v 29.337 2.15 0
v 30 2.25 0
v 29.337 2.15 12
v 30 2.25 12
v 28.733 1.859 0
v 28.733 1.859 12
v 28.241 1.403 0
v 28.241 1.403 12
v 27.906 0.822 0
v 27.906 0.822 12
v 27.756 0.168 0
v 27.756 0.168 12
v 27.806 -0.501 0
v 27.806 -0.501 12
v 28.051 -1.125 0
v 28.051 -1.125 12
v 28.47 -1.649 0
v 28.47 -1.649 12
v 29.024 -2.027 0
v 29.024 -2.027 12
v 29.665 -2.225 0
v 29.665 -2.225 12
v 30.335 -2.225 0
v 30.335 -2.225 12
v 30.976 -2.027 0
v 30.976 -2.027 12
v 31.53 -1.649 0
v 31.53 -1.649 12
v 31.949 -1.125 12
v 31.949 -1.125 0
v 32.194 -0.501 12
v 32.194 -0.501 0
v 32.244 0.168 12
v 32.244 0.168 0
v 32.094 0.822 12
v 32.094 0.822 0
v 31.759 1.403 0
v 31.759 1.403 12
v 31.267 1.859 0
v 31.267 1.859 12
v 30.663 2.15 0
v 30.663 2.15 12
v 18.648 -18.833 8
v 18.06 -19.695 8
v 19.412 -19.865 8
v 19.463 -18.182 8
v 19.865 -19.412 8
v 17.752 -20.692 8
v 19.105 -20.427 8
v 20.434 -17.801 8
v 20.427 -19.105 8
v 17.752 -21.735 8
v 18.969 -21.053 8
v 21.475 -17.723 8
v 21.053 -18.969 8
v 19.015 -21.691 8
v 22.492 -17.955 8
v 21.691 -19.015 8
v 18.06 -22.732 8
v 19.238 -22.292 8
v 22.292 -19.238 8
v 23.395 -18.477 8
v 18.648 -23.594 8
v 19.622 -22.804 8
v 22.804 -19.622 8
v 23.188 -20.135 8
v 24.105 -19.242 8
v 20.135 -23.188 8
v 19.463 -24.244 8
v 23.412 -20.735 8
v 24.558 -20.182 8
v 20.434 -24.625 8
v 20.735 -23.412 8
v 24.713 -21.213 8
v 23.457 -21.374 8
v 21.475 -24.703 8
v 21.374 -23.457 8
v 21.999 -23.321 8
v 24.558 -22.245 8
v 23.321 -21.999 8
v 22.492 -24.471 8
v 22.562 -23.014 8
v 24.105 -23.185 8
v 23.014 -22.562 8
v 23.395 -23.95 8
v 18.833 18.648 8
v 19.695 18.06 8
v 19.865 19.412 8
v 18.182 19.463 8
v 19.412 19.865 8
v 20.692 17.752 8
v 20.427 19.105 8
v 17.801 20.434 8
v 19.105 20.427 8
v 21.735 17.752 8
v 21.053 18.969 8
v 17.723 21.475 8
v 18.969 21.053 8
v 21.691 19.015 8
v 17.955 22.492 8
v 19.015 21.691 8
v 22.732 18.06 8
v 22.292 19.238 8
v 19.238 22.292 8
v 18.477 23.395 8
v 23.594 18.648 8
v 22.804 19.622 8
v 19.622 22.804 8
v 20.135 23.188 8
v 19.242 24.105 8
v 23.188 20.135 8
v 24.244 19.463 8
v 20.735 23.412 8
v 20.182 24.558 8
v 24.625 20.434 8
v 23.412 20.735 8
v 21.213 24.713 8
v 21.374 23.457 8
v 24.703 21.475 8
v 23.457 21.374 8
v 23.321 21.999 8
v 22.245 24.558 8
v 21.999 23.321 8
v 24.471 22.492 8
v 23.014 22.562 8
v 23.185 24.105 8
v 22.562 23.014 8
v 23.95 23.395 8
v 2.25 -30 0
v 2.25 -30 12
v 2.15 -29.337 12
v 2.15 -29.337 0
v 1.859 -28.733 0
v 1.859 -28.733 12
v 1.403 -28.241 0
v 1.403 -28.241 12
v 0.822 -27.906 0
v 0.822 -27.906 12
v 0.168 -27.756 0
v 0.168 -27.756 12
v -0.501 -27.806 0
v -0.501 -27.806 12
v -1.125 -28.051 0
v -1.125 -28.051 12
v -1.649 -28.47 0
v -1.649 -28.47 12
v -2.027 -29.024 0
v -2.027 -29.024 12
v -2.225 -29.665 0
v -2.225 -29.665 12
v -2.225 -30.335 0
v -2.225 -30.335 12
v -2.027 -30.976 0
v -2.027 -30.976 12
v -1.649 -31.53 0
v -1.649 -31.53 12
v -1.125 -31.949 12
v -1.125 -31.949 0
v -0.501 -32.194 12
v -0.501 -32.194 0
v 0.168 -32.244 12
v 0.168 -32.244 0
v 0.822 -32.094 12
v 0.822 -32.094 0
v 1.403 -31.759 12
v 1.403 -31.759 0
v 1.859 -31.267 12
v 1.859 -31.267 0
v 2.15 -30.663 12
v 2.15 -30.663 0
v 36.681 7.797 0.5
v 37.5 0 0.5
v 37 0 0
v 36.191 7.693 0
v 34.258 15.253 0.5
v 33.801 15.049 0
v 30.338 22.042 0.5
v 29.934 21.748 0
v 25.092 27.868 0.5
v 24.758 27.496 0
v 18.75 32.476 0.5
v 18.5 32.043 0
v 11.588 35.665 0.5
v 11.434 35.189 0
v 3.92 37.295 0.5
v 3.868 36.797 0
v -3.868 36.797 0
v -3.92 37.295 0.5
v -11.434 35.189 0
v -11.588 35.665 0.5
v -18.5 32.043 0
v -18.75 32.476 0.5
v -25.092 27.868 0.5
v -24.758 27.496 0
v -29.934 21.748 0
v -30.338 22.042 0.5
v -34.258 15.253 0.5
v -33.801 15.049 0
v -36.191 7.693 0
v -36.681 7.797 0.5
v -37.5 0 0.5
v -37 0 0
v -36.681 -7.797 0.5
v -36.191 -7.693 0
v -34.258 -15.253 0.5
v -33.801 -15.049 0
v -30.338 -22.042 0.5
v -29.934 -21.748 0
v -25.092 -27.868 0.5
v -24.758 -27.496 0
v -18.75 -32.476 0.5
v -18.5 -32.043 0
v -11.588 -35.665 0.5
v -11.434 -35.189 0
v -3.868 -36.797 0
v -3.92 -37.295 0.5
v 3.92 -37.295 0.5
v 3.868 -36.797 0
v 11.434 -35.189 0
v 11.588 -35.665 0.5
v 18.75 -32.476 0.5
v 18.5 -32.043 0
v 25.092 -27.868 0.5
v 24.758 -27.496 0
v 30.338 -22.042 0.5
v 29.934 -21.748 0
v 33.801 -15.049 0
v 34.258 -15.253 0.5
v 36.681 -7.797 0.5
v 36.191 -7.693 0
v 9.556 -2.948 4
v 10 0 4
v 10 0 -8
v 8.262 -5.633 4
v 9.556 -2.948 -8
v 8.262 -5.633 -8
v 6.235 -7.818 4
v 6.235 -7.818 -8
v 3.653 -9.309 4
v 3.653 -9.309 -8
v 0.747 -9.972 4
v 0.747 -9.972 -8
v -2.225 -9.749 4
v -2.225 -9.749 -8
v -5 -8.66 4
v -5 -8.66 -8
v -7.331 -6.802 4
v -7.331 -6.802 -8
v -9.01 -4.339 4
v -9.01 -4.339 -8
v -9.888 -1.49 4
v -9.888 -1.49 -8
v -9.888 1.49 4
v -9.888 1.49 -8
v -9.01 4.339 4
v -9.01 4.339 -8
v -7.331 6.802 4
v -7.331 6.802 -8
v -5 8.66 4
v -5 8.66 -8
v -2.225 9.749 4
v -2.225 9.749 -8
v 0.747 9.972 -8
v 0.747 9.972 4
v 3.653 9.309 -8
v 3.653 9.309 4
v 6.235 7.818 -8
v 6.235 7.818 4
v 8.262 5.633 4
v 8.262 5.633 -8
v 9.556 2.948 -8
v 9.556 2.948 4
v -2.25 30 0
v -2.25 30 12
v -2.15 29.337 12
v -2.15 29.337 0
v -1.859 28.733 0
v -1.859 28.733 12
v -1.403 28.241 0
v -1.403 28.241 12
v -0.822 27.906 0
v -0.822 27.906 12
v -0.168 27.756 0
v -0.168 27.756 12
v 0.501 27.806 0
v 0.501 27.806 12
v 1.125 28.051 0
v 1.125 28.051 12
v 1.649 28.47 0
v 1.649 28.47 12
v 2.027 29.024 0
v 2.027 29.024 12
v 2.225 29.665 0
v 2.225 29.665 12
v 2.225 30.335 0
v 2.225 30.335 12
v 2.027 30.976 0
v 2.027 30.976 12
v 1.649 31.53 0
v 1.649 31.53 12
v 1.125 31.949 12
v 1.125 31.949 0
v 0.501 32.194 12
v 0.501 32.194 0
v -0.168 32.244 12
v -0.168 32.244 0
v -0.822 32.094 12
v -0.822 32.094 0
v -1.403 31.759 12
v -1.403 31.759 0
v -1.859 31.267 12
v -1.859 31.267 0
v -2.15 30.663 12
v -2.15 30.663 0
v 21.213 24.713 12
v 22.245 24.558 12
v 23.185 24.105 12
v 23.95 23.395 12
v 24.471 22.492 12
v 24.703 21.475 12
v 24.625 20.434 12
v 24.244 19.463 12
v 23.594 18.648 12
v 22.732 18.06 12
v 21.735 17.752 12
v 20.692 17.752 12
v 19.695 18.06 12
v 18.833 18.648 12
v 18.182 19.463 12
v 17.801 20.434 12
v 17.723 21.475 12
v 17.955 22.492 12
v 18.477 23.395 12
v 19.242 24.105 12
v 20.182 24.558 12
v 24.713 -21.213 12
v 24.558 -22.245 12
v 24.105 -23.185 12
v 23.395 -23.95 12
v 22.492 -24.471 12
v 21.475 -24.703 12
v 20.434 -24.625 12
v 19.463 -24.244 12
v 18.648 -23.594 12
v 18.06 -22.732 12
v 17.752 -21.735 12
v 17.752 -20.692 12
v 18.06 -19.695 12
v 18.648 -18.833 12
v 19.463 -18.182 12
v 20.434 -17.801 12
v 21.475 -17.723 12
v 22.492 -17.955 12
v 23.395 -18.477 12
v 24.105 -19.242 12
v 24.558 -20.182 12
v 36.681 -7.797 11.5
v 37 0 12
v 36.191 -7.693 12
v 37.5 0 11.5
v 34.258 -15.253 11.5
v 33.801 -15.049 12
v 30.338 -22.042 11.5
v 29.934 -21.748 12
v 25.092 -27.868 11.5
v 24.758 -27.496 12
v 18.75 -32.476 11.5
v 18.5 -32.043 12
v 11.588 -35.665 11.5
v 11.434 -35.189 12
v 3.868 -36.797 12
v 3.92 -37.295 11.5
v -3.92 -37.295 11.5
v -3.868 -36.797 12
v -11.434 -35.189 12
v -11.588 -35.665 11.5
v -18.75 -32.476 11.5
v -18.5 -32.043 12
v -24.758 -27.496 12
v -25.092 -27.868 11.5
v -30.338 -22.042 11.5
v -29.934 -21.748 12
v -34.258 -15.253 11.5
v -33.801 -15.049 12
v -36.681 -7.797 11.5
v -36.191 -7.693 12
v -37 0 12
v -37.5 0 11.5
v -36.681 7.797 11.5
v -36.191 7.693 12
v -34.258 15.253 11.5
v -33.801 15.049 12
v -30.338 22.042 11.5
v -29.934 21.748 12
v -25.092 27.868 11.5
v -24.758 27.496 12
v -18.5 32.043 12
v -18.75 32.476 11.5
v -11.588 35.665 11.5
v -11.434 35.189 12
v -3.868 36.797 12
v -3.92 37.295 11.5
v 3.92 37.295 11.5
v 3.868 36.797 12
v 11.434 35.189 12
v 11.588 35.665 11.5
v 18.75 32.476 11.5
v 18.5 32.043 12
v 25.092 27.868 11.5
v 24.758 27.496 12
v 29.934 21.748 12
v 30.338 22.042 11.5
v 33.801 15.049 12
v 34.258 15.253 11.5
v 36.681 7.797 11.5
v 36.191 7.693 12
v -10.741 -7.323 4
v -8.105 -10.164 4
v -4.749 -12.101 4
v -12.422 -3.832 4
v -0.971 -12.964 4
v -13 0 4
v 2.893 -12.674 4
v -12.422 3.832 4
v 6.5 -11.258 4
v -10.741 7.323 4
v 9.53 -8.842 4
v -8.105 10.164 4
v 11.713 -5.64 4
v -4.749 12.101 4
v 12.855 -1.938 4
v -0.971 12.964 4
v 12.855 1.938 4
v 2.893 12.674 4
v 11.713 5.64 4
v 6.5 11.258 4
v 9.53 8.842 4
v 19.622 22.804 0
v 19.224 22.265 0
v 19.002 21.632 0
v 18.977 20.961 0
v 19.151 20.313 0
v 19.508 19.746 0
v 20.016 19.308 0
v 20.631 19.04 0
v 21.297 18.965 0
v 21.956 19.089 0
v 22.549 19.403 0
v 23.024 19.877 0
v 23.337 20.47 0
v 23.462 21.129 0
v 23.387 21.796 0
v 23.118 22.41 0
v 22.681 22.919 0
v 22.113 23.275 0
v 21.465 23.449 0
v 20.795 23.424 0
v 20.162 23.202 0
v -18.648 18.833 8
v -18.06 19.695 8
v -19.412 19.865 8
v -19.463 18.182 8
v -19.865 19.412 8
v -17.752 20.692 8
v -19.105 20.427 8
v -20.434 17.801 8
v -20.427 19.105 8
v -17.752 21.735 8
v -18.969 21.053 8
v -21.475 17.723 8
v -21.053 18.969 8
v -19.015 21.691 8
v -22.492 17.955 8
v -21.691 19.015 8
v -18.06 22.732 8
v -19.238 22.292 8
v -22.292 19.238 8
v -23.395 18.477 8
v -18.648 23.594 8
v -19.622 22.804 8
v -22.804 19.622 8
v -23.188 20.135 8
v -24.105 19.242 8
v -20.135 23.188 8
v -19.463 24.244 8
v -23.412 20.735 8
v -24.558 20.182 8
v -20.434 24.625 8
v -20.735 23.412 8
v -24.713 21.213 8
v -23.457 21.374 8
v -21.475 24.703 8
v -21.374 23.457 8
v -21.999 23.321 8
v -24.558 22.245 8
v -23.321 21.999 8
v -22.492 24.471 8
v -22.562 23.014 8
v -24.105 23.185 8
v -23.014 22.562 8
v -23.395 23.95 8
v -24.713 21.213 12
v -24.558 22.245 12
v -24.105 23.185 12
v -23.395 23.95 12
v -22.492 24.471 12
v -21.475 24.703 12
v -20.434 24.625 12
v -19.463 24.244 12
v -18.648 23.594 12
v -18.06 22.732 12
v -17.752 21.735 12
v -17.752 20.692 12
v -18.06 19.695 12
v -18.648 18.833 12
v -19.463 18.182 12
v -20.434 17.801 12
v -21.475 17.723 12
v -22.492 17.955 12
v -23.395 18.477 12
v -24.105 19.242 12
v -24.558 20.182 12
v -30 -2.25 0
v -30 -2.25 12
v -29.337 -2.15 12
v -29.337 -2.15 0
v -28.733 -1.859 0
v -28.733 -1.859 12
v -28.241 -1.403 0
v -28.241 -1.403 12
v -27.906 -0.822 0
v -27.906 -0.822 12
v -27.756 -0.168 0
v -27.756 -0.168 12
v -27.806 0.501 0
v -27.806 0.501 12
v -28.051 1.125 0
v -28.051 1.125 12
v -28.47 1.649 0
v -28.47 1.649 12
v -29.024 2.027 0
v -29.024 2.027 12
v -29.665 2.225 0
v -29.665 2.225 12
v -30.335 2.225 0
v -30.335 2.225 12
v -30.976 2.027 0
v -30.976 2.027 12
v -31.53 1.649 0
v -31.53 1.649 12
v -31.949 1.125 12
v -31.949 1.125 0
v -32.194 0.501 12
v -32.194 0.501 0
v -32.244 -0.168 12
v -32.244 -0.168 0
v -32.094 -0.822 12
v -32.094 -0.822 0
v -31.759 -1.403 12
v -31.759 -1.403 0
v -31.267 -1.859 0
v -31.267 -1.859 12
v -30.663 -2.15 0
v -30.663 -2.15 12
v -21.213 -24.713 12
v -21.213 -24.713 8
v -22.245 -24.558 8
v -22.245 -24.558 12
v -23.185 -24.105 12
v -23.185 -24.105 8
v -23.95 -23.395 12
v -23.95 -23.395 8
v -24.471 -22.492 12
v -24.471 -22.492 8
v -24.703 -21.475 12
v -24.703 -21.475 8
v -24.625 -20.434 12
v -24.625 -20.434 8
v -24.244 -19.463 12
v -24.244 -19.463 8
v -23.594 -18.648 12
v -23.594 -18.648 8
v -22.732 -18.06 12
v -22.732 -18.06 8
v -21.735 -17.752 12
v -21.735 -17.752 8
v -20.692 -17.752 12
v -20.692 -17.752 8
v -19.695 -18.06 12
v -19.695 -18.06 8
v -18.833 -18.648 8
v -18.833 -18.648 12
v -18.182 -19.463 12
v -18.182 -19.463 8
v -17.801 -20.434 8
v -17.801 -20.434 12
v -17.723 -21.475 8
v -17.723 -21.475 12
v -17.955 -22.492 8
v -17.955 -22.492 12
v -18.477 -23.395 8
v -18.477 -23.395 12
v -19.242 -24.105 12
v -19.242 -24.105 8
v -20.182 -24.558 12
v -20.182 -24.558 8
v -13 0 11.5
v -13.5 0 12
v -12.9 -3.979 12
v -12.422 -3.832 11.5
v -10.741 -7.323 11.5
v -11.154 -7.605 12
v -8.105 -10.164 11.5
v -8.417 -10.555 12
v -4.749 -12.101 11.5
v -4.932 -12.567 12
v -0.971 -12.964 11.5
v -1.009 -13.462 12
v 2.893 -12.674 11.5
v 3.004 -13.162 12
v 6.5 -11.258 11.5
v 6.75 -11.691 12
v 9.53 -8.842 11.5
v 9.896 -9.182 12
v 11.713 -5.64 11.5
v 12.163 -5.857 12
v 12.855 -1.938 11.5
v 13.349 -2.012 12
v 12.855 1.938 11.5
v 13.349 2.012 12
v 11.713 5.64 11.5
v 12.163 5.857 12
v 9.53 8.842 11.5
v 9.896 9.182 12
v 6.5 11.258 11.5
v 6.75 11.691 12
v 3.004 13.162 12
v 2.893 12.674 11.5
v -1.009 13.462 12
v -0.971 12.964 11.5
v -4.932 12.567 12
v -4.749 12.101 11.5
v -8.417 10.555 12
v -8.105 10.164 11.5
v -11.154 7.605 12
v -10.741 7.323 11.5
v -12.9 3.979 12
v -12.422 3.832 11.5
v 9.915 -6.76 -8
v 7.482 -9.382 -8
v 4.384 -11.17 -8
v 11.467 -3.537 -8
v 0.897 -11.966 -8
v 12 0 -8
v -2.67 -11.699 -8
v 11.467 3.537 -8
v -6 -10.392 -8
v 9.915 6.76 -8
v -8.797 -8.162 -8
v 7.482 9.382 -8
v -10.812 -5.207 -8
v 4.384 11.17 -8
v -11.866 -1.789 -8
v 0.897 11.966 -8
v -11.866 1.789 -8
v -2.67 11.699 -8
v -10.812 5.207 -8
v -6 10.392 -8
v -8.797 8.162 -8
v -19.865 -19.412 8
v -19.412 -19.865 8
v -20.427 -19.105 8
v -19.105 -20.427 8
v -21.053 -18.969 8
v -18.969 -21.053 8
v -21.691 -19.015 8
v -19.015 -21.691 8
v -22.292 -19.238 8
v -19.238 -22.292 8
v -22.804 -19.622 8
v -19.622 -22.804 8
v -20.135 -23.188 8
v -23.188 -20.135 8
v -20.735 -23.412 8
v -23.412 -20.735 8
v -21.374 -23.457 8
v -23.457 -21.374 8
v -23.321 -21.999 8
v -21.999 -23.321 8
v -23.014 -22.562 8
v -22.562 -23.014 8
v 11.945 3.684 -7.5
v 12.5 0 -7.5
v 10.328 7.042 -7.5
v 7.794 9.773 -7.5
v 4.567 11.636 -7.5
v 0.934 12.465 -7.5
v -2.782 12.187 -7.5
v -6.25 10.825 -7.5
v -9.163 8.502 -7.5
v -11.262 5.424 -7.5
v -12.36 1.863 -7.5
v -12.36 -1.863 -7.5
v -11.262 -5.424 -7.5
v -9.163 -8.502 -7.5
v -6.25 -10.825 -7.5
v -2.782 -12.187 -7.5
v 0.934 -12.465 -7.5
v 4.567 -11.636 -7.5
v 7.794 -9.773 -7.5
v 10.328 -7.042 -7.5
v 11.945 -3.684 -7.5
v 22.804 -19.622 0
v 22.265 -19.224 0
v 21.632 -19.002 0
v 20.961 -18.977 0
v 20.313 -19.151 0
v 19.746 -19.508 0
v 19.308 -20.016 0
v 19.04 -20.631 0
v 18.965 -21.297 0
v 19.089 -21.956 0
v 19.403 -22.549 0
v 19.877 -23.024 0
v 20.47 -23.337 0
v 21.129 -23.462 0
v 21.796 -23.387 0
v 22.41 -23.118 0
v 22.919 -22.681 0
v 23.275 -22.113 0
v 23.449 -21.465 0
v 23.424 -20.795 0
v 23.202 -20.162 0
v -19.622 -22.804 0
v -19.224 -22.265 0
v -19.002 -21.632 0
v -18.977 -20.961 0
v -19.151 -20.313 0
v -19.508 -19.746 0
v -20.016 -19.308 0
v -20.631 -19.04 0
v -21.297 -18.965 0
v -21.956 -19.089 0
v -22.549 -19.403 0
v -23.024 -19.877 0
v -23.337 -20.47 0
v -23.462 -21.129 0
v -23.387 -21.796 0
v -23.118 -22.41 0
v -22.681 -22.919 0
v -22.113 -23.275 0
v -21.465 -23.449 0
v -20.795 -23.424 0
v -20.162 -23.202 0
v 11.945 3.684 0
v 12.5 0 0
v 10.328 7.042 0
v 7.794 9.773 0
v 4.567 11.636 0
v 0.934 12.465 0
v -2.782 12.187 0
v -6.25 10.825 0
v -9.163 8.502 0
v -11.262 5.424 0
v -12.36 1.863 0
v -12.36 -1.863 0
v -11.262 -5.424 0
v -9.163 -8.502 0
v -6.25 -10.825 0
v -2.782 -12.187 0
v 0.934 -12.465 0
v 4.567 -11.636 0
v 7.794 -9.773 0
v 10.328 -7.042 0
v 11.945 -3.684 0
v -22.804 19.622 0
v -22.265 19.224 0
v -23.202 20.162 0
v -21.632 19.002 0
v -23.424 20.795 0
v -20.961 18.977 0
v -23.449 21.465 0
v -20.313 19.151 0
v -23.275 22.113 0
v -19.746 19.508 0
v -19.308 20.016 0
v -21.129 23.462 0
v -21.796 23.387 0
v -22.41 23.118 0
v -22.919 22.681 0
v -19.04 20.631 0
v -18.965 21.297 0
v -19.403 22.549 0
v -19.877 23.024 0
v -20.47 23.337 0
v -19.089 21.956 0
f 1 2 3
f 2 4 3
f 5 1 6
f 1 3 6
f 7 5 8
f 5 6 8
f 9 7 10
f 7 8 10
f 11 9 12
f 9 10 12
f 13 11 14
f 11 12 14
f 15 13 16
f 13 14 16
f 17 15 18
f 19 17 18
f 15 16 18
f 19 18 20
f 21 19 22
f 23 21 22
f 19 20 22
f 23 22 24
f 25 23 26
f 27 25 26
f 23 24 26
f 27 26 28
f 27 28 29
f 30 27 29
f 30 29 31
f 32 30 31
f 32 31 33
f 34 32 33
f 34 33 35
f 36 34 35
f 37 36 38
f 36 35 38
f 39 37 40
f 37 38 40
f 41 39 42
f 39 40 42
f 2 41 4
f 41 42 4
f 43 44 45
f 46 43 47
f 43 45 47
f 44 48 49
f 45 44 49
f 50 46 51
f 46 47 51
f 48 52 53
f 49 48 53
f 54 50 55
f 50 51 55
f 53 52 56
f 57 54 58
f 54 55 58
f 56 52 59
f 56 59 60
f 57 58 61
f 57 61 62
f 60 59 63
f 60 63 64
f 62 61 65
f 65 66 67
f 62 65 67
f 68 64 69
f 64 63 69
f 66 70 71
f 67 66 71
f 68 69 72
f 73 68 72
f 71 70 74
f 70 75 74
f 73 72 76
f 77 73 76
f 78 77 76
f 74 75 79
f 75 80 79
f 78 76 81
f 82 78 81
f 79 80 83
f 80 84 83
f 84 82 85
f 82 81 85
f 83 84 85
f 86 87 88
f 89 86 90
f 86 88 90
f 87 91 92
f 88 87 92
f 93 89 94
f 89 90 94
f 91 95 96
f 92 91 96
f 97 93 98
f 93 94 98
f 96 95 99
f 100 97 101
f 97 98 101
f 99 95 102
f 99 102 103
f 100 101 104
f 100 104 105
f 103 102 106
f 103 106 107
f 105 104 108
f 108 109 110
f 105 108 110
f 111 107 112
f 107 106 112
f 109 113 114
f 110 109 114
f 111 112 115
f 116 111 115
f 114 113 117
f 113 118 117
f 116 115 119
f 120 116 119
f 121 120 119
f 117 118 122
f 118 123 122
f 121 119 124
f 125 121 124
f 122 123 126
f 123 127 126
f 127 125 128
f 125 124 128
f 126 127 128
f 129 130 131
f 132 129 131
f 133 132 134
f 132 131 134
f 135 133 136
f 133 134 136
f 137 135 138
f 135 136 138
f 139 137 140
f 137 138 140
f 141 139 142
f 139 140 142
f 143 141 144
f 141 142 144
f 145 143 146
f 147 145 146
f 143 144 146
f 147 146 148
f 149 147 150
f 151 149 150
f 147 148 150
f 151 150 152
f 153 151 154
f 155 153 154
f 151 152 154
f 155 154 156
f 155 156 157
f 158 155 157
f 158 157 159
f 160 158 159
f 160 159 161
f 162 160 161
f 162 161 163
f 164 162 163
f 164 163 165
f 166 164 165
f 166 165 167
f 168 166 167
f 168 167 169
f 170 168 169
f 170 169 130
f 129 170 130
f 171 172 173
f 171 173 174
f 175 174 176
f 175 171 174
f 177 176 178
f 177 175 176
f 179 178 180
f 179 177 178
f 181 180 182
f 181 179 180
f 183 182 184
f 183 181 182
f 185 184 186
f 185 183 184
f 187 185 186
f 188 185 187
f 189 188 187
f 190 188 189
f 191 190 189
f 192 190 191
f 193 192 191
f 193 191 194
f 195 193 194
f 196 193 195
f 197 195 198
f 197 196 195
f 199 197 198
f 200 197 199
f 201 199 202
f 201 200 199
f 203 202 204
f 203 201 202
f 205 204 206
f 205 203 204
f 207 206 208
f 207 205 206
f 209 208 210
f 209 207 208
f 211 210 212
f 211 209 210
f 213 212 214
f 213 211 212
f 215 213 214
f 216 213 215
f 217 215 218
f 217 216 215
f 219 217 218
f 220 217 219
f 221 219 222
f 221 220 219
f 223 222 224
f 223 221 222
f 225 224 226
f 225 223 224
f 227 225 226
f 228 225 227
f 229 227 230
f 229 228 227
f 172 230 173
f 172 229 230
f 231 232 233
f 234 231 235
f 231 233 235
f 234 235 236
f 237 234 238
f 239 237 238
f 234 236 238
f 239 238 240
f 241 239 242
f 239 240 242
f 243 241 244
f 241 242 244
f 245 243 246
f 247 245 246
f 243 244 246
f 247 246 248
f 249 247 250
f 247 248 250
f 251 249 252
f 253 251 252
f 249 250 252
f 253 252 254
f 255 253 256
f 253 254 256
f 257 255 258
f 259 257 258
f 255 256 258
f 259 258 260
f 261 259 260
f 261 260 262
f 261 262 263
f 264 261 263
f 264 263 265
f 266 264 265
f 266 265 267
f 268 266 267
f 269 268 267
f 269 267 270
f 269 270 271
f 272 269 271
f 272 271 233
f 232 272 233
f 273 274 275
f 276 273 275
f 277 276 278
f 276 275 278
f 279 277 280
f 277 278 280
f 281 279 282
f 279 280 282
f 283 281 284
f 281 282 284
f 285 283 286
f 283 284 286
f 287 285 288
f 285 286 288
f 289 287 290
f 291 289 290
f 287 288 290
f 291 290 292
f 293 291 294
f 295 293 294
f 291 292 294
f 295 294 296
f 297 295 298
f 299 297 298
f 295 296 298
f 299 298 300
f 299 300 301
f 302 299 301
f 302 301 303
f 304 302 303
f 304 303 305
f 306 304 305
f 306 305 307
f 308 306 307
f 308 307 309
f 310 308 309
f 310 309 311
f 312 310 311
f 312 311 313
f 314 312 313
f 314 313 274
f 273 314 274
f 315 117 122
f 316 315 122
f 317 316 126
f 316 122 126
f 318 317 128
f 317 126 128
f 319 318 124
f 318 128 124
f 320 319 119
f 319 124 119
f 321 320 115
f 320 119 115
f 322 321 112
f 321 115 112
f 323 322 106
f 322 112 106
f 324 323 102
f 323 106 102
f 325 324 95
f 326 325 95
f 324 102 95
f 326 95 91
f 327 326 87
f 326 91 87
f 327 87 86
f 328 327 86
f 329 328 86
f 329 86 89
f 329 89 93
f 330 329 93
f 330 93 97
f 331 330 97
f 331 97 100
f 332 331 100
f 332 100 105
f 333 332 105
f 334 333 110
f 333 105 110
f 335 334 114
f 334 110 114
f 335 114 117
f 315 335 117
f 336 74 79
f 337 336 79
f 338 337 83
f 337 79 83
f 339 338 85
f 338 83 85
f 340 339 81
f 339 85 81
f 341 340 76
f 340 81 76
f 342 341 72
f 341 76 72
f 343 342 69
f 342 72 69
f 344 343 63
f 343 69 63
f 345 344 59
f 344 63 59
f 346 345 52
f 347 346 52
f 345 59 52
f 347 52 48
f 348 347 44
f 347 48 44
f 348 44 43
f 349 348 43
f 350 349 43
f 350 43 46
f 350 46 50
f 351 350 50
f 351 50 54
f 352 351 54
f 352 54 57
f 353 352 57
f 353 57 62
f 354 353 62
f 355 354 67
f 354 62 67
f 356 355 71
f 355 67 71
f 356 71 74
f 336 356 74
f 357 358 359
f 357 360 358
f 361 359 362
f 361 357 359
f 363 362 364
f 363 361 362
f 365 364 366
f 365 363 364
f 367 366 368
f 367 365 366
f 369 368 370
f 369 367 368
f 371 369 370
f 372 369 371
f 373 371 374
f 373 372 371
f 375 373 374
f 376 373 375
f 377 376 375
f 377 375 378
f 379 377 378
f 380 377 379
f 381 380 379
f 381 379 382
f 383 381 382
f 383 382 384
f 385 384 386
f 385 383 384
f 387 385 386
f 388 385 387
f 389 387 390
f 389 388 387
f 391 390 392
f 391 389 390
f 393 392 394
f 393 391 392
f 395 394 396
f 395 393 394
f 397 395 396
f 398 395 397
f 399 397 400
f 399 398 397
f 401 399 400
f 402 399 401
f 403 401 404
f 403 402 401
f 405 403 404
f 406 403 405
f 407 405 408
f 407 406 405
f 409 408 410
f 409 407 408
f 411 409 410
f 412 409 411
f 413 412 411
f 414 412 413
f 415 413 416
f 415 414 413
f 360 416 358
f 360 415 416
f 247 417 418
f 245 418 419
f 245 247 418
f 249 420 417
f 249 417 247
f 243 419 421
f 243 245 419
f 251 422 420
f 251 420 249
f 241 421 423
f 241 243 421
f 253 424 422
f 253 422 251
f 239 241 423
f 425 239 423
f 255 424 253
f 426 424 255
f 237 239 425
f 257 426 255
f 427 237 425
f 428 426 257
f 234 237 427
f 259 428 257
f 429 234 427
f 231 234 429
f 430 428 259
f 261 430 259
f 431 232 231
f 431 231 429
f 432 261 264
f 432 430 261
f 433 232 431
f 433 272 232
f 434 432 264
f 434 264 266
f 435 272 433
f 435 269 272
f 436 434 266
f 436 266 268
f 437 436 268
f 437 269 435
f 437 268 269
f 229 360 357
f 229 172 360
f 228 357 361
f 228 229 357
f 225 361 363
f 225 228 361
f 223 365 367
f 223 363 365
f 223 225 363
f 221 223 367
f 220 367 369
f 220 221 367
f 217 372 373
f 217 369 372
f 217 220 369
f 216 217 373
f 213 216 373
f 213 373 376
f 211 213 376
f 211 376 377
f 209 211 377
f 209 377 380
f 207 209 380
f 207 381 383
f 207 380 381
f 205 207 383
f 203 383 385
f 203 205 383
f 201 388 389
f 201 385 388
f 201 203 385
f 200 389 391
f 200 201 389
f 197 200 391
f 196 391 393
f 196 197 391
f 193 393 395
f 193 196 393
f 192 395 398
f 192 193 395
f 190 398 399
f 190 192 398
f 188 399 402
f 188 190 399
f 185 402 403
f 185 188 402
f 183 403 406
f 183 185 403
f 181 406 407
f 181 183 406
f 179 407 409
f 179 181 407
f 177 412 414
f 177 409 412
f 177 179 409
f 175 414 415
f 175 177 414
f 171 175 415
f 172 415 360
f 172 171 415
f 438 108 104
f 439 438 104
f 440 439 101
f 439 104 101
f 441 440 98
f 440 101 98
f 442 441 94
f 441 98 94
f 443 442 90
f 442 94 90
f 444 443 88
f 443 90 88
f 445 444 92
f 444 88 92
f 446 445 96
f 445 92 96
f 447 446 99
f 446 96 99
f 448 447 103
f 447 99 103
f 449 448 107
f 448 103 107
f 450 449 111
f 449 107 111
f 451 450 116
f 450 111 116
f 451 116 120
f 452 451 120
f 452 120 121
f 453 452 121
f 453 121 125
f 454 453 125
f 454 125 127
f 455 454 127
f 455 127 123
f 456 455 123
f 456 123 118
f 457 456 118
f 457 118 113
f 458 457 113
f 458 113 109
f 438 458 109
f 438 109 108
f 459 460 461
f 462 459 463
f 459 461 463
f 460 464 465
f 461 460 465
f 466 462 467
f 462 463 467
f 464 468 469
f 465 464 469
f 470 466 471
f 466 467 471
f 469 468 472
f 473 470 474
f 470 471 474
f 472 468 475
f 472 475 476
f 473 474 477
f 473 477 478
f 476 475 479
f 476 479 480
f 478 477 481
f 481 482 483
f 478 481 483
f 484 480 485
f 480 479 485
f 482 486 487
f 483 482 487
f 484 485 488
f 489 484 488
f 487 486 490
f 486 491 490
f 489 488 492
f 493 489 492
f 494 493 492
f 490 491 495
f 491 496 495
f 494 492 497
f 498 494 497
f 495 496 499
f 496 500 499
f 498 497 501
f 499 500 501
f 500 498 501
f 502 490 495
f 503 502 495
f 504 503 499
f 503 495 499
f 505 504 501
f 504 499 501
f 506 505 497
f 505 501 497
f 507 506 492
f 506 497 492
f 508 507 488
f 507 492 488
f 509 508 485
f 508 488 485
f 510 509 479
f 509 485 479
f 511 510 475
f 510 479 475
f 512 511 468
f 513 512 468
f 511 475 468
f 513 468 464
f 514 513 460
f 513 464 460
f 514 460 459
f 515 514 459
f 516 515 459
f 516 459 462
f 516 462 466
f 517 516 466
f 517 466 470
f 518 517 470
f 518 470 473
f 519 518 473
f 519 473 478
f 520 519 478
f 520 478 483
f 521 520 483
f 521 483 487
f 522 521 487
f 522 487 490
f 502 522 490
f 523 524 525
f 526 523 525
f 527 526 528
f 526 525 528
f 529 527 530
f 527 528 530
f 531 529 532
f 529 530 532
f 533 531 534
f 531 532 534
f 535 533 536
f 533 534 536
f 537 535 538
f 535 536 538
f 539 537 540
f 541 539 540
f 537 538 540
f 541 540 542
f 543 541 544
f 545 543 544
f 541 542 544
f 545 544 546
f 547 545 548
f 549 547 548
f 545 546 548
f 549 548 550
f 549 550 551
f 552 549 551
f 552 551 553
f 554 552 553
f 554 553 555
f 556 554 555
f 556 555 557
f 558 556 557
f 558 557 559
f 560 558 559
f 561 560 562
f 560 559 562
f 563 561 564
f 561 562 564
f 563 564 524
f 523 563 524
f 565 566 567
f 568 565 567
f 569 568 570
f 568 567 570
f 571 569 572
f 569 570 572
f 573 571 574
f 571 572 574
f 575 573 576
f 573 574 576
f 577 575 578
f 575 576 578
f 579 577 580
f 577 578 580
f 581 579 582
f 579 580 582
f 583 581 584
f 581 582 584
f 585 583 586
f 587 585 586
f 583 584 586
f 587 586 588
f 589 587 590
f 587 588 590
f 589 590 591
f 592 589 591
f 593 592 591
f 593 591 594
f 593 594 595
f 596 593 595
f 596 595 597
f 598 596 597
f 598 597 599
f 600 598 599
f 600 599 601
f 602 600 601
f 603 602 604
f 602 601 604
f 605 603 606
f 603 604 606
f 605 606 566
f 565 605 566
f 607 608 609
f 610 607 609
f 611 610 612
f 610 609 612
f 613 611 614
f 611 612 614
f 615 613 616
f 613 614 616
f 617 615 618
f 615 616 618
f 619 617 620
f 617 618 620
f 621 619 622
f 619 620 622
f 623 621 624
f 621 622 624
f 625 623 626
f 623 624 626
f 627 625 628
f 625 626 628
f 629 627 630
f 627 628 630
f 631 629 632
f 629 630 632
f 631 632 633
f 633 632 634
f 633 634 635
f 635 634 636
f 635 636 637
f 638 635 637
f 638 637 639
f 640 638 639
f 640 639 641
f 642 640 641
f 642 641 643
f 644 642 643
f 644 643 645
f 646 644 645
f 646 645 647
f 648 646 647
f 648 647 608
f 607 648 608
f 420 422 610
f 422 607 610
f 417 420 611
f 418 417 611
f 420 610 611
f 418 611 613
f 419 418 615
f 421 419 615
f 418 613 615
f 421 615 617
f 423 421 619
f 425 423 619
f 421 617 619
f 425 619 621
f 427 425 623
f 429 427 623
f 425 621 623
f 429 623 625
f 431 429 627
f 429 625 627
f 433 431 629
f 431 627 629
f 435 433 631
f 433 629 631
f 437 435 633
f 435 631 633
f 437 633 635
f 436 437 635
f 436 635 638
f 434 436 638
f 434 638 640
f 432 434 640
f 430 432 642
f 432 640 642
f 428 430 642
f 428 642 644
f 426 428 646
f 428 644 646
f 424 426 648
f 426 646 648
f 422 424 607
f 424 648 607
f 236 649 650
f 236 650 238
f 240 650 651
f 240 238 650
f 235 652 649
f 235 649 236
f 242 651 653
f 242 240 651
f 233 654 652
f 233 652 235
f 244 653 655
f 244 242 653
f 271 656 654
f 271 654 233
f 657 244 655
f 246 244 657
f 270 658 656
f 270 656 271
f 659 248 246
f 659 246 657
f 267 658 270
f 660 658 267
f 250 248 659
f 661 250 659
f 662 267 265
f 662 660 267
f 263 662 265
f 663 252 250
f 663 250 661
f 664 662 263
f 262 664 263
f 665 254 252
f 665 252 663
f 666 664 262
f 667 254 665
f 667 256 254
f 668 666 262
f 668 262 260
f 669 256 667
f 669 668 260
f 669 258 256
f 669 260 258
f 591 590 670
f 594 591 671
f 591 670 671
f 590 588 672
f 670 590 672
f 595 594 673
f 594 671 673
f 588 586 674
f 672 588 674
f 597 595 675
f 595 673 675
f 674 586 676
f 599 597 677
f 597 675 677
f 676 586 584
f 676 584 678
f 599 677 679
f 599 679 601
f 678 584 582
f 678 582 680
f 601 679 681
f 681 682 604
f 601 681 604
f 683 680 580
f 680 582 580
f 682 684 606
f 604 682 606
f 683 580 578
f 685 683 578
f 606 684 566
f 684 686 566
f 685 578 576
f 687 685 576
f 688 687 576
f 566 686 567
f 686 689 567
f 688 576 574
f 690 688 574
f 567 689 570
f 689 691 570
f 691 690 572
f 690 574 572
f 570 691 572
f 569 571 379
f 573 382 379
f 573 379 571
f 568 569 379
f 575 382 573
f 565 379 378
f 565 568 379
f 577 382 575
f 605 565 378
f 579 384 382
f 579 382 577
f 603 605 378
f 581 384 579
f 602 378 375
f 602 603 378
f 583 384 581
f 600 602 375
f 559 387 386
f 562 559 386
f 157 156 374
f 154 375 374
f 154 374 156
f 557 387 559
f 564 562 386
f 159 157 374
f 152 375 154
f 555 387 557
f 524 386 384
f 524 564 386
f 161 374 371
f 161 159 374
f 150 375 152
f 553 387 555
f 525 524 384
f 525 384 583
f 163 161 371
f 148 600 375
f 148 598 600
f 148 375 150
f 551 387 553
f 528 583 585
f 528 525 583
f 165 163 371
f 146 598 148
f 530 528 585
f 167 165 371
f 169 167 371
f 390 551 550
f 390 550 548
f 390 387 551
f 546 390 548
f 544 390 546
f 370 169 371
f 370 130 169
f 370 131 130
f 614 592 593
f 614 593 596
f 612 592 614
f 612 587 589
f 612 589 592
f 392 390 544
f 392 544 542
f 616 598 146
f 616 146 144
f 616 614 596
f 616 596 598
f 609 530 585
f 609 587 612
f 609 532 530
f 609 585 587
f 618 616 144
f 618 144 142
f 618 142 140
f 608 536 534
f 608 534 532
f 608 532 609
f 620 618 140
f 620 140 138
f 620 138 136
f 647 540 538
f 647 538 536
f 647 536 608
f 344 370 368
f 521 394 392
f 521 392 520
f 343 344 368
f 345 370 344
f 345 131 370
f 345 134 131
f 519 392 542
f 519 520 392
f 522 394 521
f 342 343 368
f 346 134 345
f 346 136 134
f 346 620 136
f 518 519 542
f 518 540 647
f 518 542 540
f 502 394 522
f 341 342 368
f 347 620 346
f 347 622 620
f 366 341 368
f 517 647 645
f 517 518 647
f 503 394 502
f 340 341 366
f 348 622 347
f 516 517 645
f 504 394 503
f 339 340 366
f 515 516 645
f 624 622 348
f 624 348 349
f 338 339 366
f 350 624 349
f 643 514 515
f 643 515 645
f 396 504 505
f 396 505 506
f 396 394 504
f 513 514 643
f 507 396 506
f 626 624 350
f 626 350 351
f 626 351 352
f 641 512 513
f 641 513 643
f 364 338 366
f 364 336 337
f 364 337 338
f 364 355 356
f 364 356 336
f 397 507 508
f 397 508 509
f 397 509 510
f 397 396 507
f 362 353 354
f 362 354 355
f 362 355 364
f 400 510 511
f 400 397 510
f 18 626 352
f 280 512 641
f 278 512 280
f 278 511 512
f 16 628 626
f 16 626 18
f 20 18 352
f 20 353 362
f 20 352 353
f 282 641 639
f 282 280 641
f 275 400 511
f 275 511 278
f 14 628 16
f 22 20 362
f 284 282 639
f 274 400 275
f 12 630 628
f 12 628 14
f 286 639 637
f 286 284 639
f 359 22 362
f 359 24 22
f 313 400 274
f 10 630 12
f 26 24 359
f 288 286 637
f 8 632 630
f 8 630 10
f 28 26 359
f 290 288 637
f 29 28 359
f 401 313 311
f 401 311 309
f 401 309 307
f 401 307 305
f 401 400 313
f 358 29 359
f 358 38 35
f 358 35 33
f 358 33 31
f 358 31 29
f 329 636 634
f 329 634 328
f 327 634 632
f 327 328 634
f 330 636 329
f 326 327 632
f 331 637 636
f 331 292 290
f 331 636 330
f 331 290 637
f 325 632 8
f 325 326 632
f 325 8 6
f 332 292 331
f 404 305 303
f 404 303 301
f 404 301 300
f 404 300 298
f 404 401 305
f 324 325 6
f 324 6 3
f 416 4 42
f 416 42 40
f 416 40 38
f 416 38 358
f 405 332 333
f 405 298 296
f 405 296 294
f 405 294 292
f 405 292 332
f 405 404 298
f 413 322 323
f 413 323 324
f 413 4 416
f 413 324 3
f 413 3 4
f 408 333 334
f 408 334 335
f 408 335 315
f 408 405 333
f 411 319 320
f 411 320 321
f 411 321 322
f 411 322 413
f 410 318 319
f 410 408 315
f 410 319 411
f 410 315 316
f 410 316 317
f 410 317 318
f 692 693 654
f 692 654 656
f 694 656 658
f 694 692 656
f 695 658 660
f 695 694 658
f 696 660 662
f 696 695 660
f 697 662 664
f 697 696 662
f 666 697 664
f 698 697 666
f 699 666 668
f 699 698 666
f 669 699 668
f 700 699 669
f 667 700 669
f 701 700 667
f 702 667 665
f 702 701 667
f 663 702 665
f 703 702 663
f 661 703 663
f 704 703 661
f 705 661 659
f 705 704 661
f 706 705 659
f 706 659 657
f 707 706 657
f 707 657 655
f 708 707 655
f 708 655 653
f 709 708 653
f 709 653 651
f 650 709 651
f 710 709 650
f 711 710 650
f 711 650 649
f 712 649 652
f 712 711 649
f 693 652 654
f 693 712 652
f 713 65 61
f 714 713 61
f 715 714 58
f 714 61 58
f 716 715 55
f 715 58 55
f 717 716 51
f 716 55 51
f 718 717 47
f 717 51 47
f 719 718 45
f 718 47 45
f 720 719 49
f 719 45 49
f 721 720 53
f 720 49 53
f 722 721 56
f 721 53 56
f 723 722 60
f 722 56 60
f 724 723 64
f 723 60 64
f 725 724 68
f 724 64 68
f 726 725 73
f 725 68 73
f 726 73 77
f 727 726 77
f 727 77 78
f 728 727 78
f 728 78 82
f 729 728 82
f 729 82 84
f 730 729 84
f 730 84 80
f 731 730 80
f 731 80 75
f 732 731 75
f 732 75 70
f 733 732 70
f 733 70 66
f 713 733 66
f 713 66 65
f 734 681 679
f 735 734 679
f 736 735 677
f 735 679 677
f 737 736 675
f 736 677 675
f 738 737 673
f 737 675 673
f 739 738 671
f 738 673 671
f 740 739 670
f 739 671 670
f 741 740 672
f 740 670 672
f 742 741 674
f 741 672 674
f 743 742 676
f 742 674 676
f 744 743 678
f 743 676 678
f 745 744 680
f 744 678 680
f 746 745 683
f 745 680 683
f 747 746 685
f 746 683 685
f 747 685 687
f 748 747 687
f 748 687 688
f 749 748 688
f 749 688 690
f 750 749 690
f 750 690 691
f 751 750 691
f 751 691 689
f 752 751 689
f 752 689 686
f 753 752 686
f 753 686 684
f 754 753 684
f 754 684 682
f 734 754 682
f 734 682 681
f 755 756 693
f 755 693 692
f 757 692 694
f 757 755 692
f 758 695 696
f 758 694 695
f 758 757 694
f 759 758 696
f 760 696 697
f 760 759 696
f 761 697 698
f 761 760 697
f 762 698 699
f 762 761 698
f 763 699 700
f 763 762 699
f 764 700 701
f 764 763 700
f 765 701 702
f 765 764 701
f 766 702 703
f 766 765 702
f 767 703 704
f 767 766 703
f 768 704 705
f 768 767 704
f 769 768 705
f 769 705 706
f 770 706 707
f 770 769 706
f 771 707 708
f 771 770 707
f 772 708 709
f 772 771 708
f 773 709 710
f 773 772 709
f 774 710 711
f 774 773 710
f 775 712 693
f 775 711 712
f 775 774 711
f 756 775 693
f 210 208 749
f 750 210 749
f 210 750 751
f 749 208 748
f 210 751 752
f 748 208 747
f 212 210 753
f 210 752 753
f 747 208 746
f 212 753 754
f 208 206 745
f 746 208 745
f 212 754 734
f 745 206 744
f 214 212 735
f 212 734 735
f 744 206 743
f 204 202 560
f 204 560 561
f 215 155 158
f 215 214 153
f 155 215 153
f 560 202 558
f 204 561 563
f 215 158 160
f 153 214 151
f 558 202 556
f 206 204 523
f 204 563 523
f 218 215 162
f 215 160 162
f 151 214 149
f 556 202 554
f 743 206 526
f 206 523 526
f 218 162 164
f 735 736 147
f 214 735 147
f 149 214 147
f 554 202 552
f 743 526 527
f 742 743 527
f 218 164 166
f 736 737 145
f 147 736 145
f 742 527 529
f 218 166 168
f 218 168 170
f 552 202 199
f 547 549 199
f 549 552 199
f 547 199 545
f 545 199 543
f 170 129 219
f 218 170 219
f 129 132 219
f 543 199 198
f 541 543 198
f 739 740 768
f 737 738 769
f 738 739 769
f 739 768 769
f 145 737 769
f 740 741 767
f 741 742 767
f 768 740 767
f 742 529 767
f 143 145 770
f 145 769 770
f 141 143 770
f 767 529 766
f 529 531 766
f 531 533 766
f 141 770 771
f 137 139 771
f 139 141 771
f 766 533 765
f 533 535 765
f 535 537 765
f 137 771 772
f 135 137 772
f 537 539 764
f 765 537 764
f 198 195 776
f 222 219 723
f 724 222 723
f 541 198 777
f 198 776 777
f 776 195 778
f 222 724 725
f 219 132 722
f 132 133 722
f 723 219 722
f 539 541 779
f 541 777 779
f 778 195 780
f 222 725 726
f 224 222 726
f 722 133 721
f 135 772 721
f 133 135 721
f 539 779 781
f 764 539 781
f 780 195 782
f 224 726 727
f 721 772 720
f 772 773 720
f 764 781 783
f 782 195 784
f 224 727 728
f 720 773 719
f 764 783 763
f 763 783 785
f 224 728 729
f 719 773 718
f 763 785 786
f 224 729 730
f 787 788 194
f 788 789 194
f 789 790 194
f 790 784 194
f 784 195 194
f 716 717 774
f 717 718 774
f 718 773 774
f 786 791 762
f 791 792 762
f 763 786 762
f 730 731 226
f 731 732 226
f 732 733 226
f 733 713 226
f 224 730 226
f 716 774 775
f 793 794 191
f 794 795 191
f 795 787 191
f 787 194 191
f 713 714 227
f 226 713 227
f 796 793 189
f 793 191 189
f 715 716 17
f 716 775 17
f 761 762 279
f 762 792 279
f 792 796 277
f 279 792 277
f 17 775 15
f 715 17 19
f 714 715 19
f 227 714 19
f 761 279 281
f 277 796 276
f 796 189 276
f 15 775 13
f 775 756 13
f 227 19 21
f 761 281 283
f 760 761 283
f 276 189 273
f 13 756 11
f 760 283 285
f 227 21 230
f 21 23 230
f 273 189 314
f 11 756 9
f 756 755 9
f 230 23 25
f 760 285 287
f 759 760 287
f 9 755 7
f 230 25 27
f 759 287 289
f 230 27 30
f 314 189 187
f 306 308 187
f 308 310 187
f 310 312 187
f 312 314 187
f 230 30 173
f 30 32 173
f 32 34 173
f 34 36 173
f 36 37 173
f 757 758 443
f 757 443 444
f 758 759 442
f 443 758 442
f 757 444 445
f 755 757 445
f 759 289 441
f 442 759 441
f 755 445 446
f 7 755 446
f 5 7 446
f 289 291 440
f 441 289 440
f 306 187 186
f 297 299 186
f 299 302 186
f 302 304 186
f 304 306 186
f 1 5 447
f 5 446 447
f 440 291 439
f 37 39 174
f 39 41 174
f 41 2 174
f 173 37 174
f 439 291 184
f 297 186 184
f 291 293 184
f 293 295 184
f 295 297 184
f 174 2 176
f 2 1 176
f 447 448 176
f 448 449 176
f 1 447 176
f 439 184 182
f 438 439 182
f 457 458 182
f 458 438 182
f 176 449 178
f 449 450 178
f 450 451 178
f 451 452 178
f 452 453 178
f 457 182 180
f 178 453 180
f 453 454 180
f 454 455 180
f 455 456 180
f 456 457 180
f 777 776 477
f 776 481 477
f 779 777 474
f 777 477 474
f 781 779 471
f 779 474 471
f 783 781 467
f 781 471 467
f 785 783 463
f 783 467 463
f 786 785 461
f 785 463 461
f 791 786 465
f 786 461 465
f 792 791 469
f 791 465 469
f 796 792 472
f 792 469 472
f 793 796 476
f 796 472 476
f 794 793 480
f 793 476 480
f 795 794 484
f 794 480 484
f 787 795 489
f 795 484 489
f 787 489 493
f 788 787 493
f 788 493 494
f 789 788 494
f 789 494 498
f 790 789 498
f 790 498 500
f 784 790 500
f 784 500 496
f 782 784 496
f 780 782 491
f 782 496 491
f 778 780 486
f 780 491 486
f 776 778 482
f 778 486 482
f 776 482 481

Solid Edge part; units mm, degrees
sketch "Sketch1" plane through (60.3162, 60.3162, 0) normal (0, 0, 1) x (1, 0, 0)
  circle A0 centre (-60.3162, -60.3162) radius 37.5
  circle A1 centre (-60.3162, -60.3162) radius 10
  dimension "D1" = 75
  dimension "D2" = 20
extrude "Protrusion1" add sketch "Sketch1" along normal blind 12
sketch "Sketch2" plane through (0, 0, 0) normal (0, 0, -1) x (1, 0, 0)
  circle A0 centre (0, 0) radius 10
  circle A1 centre (0, 0) radius 12.5
  dimension "D1" = 25
extrude "Extrusionsausprägung_2" add sketch "Sketch2" along normal blind 8
chamfer "Fase_1" distance 0.5 angle 45 1 edges at (-12.5, 0, -8)
hole "Bohrung_1" at (-30, 0, 12) direction (0, 0, -1) diameter 4.5 end through all
pattern_circular "Pattern1" count 8 over 360 about axis through (0, 0, 12) along (0, 0, 1) of "Bohrung_1"
chamfer "Fase_2" distance 0.5 angle 45 2 edges at (-37.5, 0, 12) (-37.5, 0, 0)
sketch "Sketch3" plane through (0, 0, 12) normal (0, 0, 1) x (-1, 0, 0)
  circle A0 centre (0, 0) radius 11
  dimension "D1" = 22
extrude "Extrusionsausprägung_4" add sketch "Sketch3" against normal blind 7
sketch "Sketch4" plane through (0, 0, 12) normal (0, 0, 1) x (-1, 0, 0)
  circle A0 centre (0, 0) radius 13
  dimension "D1" = 26
extrude "Extrusionsausschnitt_2" cut sketch "Sketch4" against normal blind 8
chamfer "Fase_3" distance 0.5 angle 45 1 edges at (13, 0, 12)
hole "Bohrung_2" at (-21.2132, -21.2132, 12) direction (0, 0, -1) diameter 4.5 end up to next counterbore diameter 7 counterbore depth 4
pattern_circular "Pattern3" count 4 over 360 about axis through (0, 0, 12) along (0, 0, -1) of "Bohrung_2"
properties material "Aluminium, 1060"
